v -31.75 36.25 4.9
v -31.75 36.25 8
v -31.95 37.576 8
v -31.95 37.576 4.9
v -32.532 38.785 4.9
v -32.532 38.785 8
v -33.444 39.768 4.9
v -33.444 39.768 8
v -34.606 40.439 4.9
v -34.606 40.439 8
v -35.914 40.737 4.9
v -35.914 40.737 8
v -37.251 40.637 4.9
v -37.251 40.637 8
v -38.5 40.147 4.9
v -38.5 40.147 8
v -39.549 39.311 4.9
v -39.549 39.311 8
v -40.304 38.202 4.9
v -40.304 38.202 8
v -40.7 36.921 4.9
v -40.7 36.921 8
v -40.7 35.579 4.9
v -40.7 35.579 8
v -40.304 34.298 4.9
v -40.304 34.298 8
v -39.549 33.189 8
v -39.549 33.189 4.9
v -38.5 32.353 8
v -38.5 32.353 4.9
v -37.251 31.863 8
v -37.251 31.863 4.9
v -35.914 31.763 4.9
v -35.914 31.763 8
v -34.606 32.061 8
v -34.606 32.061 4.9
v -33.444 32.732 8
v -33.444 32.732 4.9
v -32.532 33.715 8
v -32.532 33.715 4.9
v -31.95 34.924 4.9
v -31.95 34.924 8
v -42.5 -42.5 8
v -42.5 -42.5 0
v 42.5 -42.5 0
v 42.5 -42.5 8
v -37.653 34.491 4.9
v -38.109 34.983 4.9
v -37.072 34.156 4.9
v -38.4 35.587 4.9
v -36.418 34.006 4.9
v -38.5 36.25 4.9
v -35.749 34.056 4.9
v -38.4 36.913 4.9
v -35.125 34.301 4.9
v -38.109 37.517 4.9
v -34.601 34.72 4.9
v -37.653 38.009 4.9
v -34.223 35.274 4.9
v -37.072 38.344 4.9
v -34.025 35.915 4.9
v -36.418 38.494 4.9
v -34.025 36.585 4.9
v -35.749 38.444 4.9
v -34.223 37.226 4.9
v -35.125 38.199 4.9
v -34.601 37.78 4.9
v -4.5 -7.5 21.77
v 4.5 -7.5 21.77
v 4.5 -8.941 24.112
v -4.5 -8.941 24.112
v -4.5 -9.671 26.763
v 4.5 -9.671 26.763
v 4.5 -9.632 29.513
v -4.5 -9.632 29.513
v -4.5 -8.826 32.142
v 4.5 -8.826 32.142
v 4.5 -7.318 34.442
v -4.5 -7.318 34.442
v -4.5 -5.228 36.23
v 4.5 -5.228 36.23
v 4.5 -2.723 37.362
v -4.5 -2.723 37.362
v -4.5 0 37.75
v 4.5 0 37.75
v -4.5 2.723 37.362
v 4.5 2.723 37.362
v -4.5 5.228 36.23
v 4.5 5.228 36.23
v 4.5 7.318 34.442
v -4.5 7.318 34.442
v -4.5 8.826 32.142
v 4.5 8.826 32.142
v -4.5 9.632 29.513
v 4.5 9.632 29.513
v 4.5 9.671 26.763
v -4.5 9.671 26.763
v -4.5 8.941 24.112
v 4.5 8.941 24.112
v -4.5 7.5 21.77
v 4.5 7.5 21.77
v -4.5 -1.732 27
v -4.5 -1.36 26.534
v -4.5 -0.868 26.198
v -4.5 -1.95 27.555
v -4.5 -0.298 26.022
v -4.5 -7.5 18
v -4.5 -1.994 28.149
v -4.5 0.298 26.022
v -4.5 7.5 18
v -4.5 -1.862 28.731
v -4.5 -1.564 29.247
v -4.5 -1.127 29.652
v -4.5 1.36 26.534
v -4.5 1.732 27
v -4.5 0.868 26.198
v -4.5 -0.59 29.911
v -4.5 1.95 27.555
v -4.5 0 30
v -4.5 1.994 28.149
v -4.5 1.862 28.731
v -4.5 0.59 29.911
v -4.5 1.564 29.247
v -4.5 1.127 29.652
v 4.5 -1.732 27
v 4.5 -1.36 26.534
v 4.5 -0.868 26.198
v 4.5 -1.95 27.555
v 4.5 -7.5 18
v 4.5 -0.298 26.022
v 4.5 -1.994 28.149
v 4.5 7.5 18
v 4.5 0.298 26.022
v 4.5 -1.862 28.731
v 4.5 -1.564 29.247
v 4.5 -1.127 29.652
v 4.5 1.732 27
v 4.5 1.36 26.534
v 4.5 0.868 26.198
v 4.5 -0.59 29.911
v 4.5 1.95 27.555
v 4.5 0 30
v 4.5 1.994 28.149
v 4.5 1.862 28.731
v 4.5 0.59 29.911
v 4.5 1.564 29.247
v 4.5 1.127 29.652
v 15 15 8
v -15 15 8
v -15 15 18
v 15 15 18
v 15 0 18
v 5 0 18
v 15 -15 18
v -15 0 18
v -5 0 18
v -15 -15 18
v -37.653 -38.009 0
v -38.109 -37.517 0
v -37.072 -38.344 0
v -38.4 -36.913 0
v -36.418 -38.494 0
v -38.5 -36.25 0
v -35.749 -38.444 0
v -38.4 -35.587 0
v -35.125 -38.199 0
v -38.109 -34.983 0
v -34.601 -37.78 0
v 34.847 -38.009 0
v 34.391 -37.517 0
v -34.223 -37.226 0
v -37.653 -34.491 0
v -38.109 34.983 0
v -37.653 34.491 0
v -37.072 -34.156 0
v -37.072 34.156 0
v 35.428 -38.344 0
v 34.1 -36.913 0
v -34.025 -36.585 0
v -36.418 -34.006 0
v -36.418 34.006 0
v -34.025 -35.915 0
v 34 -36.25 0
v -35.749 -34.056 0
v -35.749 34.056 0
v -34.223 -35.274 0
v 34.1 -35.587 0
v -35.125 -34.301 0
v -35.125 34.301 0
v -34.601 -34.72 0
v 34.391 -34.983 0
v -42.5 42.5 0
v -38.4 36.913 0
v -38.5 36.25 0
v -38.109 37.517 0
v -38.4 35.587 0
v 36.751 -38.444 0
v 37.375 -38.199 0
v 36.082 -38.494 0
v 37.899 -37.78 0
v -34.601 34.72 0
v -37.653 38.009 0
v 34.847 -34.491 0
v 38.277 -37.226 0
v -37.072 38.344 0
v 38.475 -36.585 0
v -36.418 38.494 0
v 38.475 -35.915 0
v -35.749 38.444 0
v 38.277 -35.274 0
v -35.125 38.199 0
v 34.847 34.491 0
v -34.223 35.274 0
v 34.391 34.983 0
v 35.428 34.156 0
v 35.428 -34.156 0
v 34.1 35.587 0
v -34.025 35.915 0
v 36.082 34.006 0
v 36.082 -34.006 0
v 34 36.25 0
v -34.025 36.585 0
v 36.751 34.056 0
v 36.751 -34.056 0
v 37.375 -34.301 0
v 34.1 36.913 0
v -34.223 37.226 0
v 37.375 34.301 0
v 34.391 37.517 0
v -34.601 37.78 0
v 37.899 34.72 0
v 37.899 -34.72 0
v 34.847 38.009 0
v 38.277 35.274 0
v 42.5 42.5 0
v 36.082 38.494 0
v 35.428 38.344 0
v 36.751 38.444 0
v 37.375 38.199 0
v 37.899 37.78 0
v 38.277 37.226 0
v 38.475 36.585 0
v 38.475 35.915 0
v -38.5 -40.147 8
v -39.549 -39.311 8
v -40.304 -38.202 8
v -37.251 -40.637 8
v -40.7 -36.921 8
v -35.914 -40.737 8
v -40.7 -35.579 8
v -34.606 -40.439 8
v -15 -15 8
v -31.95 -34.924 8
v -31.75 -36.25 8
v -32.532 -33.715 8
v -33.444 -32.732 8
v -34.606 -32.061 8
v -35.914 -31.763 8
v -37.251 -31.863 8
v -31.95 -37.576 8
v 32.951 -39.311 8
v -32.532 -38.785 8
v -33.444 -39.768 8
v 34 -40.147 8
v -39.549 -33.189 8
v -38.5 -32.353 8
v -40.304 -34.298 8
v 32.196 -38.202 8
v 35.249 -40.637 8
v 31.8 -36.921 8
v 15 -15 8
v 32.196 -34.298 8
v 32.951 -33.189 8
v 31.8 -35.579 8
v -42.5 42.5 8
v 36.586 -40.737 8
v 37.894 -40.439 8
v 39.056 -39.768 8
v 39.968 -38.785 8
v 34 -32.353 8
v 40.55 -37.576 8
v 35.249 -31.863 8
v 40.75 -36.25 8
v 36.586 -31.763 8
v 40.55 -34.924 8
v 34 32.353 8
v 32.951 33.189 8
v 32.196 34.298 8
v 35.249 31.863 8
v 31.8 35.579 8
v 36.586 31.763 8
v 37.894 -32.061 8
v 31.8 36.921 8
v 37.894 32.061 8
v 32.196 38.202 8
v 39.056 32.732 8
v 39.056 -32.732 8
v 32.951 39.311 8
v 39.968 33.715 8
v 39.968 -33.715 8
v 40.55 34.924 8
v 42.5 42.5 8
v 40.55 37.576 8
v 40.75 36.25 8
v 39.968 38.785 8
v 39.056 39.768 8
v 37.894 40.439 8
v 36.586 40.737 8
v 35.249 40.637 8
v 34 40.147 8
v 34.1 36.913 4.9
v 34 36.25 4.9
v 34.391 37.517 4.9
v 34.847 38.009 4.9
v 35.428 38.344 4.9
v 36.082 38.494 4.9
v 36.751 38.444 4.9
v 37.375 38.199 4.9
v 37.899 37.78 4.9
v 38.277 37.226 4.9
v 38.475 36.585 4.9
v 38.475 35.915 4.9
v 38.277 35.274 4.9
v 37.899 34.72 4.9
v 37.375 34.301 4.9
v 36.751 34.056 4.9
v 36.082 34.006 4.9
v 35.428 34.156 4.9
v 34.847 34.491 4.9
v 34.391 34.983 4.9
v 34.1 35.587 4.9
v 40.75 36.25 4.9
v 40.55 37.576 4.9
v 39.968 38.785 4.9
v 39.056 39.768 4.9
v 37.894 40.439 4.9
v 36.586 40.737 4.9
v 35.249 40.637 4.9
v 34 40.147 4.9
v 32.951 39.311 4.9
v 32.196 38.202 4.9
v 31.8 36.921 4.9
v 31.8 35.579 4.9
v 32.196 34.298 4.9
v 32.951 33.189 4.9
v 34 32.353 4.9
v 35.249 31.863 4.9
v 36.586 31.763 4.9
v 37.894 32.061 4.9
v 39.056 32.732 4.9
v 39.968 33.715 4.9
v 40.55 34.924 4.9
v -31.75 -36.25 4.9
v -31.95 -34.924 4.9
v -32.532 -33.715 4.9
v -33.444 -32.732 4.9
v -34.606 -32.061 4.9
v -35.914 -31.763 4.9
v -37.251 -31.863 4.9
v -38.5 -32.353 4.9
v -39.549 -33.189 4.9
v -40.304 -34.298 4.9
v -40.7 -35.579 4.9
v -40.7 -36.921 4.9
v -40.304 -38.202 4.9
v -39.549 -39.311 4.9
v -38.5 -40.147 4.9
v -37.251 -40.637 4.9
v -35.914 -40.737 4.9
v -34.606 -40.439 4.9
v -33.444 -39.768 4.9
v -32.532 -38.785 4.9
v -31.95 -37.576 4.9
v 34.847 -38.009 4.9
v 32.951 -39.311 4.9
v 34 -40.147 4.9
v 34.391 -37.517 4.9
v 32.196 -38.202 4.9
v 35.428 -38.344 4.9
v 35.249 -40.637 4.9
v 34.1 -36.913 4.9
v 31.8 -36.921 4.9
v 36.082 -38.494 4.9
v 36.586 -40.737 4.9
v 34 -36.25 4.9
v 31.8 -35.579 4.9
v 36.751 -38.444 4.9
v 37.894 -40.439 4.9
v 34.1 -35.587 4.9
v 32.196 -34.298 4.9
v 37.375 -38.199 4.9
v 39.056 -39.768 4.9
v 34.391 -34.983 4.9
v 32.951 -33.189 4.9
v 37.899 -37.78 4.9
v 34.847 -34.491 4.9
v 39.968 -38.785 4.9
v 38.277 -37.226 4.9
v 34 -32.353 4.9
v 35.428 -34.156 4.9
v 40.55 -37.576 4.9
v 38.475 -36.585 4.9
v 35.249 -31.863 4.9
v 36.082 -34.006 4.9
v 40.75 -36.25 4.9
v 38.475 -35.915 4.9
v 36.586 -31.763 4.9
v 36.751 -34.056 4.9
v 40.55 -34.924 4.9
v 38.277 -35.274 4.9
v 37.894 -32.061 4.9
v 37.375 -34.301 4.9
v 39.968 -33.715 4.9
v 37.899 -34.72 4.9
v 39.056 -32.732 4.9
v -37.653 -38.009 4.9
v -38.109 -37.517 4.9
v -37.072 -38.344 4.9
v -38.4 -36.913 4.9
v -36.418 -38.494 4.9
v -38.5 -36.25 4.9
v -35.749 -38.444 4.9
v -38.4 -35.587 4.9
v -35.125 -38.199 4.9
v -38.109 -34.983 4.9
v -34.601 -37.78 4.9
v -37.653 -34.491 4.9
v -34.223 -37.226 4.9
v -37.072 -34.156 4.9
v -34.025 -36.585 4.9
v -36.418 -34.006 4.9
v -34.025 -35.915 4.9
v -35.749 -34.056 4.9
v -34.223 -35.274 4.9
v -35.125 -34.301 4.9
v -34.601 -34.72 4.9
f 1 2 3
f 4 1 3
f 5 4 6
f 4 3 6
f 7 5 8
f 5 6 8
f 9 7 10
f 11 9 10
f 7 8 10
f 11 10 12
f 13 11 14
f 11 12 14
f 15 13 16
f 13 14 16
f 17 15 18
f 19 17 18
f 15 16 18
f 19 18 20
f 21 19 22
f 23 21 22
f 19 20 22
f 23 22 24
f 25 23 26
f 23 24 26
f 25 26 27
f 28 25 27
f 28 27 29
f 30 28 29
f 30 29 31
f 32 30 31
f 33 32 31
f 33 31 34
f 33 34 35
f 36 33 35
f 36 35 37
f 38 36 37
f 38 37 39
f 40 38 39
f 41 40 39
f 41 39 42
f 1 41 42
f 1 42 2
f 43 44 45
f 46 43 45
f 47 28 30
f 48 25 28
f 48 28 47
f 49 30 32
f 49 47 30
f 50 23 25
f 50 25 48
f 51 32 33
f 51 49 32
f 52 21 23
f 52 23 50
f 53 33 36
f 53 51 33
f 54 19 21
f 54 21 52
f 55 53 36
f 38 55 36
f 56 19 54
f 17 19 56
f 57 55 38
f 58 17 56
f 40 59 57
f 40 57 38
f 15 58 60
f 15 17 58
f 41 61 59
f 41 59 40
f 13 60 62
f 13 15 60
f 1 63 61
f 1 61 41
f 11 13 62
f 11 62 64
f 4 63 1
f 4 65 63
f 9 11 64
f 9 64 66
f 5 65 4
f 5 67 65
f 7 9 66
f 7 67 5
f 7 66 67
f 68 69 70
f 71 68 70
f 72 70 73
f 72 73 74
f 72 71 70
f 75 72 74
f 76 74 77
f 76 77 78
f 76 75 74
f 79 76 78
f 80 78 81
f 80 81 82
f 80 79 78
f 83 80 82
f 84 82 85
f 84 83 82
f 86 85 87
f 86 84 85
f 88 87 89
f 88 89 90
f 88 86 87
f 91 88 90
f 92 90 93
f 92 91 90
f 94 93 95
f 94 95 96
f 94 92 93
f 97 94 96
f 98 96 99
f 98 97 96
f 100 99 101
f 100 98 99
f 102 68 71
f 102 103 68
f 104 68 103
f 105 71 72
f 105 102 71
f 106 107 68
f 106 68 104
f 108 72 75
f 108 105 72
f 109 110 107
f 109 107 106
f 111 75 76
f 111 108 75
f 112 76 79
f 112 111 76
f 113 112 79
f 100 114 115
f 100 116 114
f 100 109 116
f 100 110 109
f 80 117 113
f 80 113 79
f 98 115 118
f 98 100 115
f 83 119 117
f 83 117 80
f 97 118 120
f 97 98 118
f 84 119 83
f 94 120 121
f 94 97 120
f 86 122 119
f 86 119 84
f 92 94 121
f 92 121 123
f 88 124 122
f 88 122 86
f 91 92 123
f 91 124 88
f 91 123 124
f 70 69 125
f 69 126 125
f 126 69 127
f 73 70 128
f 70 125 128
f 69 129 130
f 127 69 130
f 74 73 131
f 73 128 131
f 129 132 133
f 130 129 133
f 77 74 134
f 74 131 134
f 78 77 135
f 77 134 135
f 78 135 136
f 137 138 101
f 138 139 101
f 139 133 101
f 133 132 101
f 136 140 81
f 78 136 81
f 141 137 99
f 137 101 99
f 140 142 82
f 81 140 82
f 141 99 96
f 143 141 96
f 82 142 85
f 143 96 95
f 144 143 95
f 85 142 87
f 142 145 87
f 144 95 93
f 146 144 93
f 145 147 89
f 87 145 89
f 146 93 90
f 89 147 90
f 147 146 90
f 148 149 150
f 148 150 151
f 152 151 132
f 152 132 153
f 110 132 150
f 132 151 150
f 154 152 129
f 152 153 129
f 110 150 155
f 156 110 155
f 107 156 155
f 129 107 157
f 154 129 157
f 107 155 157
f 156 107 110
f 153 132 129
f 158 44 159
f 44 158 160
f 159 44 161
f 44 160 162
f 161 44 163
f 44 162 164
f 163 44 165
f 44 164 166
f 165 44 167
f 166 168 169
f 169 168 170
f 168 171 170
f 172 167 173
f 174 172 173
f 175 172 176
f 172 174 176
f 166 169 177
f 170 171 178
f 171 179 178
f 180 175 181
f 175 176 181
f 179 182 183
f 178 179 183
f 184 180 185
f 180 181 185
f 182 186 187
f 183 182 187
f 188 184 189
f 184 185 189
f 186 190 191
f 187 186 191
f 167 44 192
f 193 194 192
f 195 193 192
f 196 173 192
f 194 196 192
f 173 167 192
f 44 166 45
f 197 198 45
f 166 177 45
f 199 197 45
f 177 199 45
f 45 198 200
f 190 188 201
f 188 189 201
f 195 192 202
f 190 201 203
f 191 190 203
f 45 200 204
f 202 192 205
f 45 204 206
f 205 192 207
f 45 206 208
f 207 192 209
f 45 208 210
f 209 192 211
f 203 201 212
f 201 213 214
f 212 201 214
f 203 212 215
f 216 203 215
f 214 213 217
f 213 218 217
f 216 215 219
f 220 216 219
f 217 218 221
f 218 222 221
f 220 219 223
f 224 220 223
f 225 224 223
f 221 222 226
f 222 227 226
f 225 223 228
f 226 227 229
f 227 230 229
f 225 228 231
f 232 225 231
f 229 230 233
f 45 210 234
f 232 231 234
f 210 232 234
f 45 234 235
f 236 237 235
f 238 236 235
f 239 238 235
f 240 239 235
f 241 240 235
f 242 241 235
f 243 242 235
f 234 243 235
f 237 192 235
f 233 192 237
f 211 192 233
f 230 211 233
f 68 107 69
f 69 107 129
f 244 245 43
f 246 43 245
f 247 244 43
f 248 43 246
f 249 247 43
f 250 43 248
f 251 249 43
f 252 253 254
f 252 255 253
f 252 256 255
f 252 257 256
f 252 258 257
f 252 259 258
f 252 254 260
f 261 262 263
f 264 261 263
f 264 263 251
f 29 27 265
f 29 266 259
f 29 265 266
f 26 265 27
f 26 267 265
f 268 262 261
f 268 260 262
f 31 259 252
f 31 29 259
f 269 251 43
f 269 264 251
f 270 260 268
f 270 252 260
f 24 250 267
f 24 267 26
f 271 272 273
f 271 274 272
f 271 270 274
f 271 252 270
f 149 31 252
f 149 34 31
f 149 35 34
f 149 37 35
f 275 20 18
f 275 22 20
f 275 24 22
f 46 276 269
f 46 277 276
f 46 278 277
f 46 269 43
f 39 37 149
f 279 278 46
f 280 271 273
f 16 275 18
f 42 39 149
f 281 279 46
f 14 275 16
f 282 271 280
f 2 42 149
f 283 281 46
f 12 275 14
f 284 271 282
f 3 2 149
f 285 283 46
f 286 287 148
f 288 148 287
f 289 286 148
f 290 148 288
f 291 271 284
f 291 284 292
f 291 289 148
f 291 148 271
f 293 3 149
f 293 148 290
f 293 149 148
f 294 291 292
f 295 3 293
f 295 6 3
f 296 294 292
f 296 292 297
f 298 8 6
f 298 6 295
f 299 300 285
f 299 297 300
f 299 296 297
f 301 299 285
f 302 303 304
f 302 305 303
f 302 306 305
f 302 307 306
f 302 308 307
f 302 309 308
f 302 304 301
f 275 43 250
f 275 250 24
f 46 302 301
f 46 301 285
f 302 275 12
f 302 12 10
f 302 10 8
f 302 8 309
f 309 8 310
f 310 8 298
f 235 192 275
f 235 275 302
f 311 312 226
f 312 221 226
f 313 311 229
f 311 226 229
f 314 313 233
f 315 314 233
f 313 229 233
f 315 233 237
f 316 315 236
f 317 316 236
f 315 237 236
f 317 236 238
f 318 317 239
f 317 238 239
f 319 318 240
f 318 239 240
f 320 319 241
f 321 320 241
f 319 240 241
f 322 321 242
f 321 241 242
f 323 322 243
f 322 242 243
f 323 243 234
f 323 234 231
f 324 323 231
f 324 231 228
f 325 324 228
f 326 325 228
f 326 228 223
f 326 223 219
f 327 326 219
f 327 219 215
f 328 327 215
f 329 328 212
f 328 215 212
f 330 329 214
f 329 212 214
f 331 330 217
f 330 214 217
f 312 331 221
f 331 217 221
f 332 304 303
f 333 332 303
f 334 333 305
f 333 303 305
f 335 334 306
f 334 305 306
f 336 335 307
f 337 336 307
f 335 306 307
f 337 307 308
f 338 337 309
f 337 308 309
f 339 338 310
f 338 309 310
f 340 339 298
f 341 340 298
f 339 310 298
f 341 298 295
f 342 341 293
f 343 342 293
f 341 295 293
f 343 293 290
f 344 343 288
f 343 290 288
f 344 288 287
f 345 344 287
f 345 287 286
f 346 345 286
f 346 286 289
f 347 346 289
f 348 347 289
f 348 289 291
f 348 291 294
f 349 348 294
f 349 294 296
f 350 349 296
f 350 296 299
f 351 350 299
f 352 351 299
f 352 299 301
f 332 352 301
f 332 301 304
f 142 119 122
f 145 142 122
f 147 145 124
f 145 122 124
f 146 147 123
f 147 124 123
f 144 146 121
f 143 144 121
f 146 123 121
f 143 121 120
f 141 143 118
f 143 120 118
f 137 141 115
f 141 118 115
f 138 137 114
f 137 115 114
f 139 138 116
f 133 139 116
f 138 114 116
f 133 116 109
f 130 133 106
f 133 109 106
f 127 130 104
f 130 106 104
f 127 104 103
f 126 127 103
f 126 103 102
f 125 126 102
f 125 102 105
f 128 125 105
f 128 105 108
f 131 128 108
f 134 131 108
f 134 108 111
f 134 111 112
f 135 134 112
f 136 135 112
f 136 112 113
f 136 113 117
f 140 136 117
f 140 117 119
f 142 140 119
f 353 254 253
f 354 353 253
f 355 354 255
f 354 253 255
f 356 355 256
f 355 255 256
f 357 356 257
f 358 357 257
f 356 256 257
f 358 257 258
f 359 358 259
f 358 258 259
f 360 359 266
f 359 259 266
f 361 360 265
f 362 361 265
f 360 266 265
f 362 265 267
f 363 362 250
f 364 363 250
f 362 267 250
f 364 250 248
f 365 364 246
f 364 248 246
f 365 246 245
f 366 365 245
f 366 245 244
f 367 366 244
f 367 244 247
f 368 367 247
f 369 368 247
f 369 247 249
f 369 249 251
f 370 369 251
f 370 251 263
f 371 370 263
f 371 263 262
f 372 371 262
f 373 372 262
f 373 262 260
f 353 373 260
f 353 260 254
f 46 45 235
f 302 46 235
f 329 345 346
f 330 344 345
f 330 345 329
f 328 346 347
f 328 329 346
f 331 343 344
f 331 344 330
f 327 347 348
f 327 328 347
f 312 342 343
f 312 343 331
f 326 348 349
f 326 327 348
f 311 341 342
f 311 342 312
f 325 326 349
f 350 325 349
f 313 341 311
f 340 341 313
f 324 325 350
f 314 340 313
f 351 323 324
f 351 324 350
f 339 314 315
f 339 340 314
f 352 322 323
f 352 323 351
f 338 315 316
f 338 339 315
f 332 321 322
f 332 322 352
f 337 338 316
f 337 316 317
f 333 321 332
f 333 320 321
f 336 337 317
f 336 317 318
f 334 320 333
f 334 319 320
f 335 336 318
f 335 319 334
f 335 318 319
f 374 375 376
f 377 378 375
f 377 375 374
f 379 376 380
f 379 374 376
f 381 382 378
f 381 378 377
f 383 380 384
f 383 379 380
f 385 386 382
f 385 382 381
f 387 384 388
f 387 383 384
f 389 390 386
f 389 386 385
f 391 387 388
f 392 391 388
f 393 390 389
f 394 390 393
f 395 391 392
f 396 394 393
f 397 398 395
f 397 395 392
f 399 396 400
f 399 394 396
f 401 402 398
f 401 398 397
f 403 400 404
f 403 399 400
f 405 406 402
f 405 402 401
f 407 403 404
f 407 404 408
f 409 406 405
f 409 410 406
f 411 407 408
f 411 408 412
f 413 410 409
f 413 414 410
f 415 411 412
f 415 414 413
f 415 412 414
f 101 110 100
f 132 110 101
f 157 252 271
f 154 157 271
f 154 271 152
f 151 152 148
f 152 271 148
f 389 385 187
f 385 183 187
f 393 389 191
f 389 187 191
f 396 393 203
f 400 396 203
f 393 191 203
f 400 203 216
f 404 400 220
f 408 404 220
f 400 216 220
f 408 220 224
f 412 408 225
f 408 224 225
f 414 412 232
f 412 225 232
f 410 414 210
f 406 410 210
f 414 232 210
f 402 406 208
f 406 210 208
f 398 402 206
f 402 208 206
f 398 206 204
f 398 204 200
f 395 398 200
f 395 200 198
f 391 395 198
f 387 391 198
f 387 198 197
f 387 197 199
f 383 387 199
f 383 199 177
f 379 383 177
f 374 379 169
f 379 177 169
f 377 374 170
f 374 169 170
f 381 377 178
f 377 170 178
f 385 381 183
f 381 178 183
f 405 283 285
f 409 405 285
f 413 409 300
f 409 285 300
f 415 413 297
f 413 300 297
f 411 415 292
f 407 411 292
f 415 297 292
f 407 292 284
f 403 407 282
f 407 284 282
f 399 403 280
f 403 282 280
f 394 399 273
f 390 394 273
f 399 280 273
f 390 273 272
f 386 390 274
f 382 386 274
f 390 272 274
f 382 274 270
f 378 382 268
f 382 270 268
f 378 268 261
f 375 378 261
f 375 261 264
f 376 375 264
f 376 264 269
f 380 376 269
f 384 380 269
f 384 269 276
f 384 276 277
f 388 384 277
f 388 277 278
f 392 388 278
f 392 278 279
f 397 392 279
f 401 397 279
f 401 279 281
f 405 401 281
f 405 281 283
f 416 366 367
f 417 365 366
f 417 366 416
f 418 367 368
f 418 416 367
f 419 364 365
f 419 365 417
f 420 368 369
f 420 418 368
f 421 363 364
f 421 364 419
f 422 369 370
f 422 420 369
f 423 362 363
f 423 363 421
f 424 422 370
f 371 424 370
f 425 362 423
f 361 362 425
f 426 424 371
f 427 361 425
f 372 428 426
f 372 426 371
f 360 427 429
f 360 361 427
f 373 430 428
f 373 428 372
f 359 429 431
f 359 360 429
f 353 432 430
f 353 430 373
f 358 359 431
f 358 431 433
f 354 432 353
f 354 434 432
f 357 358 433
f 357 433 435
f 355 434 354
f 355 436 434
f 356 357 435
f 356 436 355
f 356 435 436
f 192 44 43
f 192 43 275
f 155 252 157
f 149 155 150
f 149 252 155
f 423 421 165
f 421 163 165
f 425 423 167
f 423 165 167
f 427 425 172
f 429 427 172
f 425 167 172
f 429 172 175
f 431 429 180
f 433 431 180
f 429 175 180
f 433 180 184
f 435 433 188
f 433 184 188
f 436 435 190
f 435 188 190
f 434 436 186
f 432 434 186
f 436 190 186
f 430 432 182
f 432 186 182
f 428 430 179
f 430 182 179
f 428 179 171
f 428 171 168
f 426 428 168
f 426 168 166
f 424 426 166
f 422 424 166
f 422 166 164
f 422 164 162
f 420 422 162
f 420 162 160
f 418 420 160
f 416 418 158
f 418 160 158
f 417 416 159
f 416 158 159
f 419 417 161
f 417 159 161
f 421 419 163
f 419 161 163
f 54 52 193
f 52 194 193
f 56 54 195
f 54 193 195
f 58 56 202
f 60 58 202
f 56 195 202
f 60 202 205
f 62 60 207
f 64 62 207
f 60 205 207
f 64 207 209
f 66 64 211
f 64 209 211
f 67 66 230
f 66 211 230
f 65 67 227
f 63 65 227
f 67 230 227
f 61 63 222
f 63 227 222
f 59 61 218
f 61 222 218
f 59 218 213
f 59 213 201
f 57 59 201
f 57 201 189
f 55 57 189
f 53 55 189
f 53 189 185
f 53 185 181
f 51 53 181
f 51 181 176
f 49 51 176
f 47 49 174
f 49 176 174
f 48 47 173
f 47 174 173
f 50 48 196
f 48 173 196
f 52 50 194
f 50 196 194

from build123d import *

# Parameters (mm, degrees)
ESBO_O1_W                                            = 85
ESBO_O1_H                                            = 85
RESSALTO_EXTRUS_O1_DEPTH                             = 8
REBAIXO_PARA_PARAFUSO_DE_M_QUINA_COM_CAB_D           = 4.5
REBAIXO_PARA_PARAFUSO_DE_M_QUINA_COM_CAB_CBORE_D     = 9
REBAIXO_PARA_PARAFUSO_DE_M_QUINA_COM_CAB_CBORE_DEPTH = 3.1
ESBO_O5_W                                            = 30
ESBO_O5_H                                            = 30
RESSALTO_EXTRUS_O2_DEPTH                             = 20
ESBO_O6_R                                            = 10
CORTE_EXTRUS_O1_DEPTH                                = 10
ESBO_O7_R                                            = 10
CORTE_EXTRUS_O2_DEPTH                                = 10
CORTE_EXTRUS_O3_DEPTH                                = 58.5
ESBO_O9_W                                            = 9
ESBO_O9_H                                            = 15
RESSALTO_EXTRUS_O3_DEPTH                             = 10
ESBO_O10_R                                           = 9.75
RESSALTO_EXTRUS_O4_DEPTH                             = 9
ESBO_O11_R                                           = 2
CORTE_EXTRUS_O4_DEPTH                                = 48


with BuildPart() as part:
    # Esboço1 → Ressalto-extrusão1 (new body)
    with BuildSketch(Plane.XY):
        Rectangle(ESBO_O1_W, ESBO_O1_H)
    extrude(amount=RESSALTO_EXTRUS_O1_DEPTH)

    # Rebaixo para parafuso de máquina com cabeça panela de M41 (through all)
    with Locations(Plane.XY.offset(8)):
        with Locations((-36.25, 36.25), (-36.25, -36.25), (36.25, -36.25), (36.25, 36.25)):
            CounterBoreHole(REBAIXO_PARA_PARAFUSO_DE_M_QUINA_COM_CAB_D / 2, REBAIXO_PARA_PARAFUSO_DE_M_QUINA_COM_CAB_CBORE_D / 2, REBAIXO_PARA_PARAFUSO_DE_M_QUINA_COM_CAB_CBORE_DEPTH)

    # Esboço5 → Ressalto-extrusão2 (add)
    with BuildSketch(Plane.XY.offset(8)):
        Rectangle(ESBO_O5_W, ESBO_O5_H)
    extrude(amount=RESSALTO_EXTRUS_O2_DEPTH)

    # Esboço6 → Corte-extrusão1 (cut)
    with BuildSketch(Plane(origin=(15, 0, 0), x_dir=(0, 0, -1), z_dir=(1, 0, 0))):
        with Locations((-28, 0)):
            Circle(ESBO_O6_R)
    extrude(amount=-CORTE_EXTRUS_O1_DEPTH, mode=Mode.SUBTRACT)

    # Esboço7 → Corte-extrusão2 (cut)
    with BuildSketch(Plane.ZY.offset(15)):
        with Locations((28, 0)):
            Circle(ESBO_O7_R)
    extrude(amount=-CORTE_EXTRUS_O2_DEPTH, mode=Mode.SUBTRACT)

    # Esboço8 → Corte-extrusão3 (cut, through all)
    with BuildSketch(Plane.ZY.offset(15)):
        Polygon((18, 10), (18, 15), (28, 15), (28, 10), (28, -10), (28, -15), (18, -15), (18, -10), align=None)
    extrude(amount=-CORTE_EXTRUS_O3_DEPTH, mode=Mode.SUBTRACT)

    # Esboço9 → Ressalto-extrusão3 (add)
    with BuildSketch(Plane.XY.offset(18)):
        Rectangle(ESBO_O9_W, ESBO_O9_H)
    extrude(amount=RESSALTO_EXTRUS_O3_DEPTH)

    # Esboço10 → Ressalto-extrusão4 (add)
    with BuildSketch(Plane.ZY.offset(4.5)):
        with Locations((28, 0)):
            Circle(ESBO_O10_R)
    extrude(amount=-RESSALTO_EXTRUS_O4_DEPTH)

    # Esboço11 → Corte-extrusão4 (cut, through all)
    with BuildSketch(Plane.ZY.offset(4.5)):
        with Locations((28, 0)):
            Circle(ESBO_O11_R)
    extrude(amount=-CORTE_EXTRUS_O4_DEPTH, mode=Mode.SUBTRACT)


solid = part.part
